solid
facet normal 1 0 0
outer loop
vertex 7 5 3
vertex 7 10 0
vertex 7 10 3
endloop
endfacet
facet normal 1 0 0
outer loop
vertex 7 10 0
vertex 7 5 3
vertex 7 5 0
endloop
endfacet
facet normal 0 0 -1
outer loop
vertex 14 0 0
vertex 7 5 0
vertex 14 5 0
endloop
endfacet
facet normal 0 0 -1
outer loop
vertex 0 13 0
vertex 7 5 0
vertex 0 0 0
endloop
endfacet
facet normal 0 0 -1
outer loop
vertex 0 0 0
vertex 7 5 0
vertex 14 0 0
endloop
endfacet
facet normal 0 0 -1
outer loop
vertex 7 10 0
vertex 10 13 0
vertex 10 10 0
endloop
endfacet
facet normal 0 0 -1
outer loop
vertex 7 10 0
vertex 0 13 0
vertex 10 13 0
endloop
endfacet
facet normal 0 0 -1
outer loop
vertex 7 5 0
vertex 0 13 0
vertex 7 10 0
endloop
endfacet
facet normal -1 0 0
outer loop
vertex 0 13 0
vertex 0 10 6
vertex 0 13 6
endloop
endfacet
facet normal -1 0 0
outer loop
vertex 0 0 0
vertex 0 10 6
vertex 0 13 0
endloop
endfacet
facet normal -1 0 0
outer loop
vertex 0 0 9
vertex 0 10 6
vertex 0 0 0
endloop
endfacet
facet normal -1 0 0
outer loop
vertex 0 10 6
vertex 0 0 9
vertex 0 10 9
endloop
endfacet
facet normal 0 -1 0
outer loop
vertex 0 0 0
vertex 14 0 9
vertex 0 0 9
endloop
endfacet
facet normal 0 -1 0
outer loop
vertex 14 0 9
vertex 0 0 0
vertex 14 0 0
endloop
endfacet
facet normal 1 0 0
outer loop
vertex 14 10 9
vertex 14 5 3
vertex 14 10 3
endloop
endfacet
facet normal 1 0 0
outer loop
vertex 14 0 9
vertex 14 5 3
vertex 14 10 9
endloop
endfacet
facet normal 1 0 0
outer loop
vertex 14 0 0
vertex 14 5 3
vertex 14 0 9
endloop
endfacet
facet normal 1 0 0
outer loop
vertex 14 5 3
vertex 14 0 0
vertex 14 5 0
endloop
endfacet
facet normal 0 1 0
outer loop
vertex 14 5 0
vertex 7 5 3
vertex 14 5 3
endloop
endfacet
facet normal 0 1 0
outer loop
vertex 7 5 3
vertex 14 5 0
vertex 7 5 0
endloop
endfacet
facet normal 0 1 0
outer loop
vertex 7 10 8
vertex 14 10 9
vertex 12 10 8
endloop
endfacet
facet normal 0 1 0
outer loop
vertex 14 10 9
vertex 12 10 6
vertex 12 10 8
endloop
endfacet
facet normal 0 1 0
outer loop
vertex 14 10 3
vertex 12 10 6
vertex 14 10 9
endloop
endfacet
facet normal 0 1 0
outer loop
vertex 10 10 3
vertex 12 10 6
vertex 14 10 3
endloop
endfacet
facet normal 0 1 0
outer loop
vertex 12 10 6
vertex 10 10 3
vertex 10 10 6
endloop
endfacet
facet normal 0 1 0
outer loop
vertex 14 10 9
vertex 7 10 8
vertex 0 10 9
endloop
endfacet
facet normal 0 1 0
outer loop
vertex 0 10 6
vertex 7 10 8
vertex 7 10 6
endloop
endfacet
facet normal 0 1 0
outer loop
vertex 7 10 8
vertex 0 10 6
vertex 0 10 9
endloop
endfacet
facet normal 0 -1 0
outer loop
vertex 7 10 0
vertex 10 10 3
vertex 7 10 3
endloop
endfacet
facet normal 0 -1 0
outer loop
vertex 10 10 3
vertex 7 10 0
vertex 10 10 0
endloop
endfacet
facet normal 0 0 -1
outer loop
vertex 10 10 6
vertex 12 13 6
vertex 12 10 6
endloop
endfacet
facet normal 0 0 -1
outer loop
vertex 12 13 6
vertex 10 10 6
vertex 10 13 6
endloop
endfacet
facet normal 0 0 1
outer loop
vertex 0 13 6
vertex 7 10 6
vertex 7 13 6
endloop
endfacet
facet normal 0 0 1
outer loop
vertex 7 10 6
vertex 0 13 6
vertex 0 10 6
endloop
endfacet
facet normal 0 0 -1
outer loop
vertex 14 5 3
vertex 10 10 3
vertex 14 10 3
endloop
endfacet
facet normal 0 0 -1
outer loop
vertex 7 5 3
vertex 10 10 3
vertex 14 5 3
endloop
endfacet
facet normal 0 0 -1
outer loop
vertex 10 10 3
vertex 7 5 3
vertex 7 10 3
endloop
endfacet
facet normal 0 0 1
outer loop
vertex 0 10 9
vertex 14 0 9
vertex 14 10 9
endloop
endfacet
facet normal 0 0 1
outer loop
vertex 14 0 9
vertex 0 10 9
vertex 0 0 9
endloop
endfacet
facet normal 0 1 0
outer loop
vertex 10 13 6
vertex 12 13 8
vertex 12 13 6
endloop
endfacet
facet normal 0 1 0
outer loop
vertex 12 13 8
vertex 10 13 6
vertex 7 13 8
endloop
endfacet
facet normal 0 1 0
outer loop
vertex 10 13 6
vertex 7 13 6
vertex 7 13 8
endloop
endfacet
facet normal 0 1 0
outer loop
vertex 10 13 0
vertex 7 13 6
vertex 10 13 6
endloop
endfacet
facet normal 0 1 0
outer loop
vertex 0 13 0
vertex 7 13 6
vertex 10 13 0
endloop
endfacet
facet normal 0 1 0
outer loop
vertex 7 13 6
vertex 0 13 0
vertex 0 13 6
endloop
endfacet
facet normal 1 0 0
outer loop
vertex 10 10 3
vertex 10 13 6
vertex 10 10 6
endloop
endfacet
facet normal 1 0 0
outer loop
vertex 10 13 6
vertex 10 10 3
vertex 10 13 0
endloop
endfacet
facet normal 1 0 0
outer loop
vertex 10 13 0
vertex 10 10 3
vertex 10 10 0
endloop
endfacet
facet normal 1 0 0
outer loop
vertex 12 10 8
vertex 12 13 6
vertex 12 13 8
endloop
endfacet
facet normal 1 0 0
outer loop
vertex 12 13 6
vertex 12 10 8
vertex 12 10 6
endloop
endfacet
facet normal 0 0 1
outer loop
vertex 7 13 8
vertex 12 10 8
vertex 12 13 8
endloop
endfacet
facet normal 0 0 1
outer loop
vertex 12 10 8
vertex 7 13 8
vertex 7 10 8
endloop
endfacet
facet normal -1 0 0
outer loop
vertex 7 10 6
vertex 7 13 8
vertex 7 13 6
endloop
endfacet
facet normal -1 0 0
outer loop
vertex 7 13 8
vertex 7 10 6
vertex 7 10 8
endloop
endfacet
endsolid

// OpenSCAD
translate([3.5, 2.5, 1.5]) color([0.6469257198353225, 0.3502939673965323, 0.18031790152968785]) cube([7, 5, 3], center=true);
translate([10.5, 2.5, 1.5]) color([0.5036365052098872, 0.03937870708469238, 0.10092124118896661]) cube([7, 5, 3], center=true);
translate([3.5, 7.5, 1.5]) color([0.9882351487225011, 0.19935579046706298, 0.35855530131160185]) cube([7, 5, 3], center=true);
translate([3.5, 2.5, 4.5]) color([0.7315983062253606, 0.8383265651934163, 0.9184820619953314]) cube([7, 5, 3], center=true);
translate([10.5, 2.5, 4.5]) color([0.16942460609746768, 0.6726405635730526, 0.9665489030431832]) cube([7, 5, 3], center=true);
translate([3.5, 7.5, 4.5]) color([0.05805094382649867, 0.6762017842993783, 0.8454245937016164]) cube([7, 5, 3], center=true);
translate([10.5, 7.5, 4.5]) color([0.342312541078584, 0.25068733928511167, 0.596791393469411]) cube([7, 5, 3], center=true);
translate([3.5, 2.5, 7.5]) color([0.44231403369907896, 0.17481948445144113, 0.47162541509628797]) cube([7, 5, 3], center=true);
translate([10.5, 2.5, 7.5]) color([0.40990539565755457, 0.5691127395242802, 0.5086001300626332]) cube([7, 5, 3], center=true);
translate([3.5, 7.5, 7.5]) color([0.3114460010002068, 0.35715168259026286, 0.837661174368979]) cube([7, 5, 3], center=true);
translate([10.5, 7.5, 7.5]) color([0.25093266482213705, 0.560600218853524, 0.012436318829314397]) cube([7, 5, 3], center=true);
translate([2.5, 11.5, 1.0]) color([0.7415743774106636, 0.3359165544734606, 0.04569649356841665]) cube([5, 3, 2], center=true);
translate([7.5, 11.5, 1.0]) color([0.28088316421834825, 0.24013040782635398, 0.9531293398277989]) cube([5, 3, 2], center=true);
translate([2.5, 11.5, 3.0]) color([0.35222556151550743, 0.2878779148564, 0.35920119725374633]) cube([5, 3, 2], center=true);
translate([7.5, 11.5, 3.0]) color([0.9469058356578911, 0.6337478522492526, 0.6210768456186673]) cube([5, 3, 2], center=true);
translate([2.5, 11.5, 5.0]) color([0.7156193503014563, 0.38801723531250565, 0.4144179882772473]) cube([5, 3, 2], center=true);
translate([7.5, 11.5, 5.0]) color([0.650832862263345, 0.001524221856720187, 0.1923095412446758]) cube([5, 3, 2], center=true);
translate([9.5, 11.5, 7.0]) color([0.3344016906625016, 0.23941596018595857, 0.6373994011293003]) cube([5, 3, 2], center=true);
